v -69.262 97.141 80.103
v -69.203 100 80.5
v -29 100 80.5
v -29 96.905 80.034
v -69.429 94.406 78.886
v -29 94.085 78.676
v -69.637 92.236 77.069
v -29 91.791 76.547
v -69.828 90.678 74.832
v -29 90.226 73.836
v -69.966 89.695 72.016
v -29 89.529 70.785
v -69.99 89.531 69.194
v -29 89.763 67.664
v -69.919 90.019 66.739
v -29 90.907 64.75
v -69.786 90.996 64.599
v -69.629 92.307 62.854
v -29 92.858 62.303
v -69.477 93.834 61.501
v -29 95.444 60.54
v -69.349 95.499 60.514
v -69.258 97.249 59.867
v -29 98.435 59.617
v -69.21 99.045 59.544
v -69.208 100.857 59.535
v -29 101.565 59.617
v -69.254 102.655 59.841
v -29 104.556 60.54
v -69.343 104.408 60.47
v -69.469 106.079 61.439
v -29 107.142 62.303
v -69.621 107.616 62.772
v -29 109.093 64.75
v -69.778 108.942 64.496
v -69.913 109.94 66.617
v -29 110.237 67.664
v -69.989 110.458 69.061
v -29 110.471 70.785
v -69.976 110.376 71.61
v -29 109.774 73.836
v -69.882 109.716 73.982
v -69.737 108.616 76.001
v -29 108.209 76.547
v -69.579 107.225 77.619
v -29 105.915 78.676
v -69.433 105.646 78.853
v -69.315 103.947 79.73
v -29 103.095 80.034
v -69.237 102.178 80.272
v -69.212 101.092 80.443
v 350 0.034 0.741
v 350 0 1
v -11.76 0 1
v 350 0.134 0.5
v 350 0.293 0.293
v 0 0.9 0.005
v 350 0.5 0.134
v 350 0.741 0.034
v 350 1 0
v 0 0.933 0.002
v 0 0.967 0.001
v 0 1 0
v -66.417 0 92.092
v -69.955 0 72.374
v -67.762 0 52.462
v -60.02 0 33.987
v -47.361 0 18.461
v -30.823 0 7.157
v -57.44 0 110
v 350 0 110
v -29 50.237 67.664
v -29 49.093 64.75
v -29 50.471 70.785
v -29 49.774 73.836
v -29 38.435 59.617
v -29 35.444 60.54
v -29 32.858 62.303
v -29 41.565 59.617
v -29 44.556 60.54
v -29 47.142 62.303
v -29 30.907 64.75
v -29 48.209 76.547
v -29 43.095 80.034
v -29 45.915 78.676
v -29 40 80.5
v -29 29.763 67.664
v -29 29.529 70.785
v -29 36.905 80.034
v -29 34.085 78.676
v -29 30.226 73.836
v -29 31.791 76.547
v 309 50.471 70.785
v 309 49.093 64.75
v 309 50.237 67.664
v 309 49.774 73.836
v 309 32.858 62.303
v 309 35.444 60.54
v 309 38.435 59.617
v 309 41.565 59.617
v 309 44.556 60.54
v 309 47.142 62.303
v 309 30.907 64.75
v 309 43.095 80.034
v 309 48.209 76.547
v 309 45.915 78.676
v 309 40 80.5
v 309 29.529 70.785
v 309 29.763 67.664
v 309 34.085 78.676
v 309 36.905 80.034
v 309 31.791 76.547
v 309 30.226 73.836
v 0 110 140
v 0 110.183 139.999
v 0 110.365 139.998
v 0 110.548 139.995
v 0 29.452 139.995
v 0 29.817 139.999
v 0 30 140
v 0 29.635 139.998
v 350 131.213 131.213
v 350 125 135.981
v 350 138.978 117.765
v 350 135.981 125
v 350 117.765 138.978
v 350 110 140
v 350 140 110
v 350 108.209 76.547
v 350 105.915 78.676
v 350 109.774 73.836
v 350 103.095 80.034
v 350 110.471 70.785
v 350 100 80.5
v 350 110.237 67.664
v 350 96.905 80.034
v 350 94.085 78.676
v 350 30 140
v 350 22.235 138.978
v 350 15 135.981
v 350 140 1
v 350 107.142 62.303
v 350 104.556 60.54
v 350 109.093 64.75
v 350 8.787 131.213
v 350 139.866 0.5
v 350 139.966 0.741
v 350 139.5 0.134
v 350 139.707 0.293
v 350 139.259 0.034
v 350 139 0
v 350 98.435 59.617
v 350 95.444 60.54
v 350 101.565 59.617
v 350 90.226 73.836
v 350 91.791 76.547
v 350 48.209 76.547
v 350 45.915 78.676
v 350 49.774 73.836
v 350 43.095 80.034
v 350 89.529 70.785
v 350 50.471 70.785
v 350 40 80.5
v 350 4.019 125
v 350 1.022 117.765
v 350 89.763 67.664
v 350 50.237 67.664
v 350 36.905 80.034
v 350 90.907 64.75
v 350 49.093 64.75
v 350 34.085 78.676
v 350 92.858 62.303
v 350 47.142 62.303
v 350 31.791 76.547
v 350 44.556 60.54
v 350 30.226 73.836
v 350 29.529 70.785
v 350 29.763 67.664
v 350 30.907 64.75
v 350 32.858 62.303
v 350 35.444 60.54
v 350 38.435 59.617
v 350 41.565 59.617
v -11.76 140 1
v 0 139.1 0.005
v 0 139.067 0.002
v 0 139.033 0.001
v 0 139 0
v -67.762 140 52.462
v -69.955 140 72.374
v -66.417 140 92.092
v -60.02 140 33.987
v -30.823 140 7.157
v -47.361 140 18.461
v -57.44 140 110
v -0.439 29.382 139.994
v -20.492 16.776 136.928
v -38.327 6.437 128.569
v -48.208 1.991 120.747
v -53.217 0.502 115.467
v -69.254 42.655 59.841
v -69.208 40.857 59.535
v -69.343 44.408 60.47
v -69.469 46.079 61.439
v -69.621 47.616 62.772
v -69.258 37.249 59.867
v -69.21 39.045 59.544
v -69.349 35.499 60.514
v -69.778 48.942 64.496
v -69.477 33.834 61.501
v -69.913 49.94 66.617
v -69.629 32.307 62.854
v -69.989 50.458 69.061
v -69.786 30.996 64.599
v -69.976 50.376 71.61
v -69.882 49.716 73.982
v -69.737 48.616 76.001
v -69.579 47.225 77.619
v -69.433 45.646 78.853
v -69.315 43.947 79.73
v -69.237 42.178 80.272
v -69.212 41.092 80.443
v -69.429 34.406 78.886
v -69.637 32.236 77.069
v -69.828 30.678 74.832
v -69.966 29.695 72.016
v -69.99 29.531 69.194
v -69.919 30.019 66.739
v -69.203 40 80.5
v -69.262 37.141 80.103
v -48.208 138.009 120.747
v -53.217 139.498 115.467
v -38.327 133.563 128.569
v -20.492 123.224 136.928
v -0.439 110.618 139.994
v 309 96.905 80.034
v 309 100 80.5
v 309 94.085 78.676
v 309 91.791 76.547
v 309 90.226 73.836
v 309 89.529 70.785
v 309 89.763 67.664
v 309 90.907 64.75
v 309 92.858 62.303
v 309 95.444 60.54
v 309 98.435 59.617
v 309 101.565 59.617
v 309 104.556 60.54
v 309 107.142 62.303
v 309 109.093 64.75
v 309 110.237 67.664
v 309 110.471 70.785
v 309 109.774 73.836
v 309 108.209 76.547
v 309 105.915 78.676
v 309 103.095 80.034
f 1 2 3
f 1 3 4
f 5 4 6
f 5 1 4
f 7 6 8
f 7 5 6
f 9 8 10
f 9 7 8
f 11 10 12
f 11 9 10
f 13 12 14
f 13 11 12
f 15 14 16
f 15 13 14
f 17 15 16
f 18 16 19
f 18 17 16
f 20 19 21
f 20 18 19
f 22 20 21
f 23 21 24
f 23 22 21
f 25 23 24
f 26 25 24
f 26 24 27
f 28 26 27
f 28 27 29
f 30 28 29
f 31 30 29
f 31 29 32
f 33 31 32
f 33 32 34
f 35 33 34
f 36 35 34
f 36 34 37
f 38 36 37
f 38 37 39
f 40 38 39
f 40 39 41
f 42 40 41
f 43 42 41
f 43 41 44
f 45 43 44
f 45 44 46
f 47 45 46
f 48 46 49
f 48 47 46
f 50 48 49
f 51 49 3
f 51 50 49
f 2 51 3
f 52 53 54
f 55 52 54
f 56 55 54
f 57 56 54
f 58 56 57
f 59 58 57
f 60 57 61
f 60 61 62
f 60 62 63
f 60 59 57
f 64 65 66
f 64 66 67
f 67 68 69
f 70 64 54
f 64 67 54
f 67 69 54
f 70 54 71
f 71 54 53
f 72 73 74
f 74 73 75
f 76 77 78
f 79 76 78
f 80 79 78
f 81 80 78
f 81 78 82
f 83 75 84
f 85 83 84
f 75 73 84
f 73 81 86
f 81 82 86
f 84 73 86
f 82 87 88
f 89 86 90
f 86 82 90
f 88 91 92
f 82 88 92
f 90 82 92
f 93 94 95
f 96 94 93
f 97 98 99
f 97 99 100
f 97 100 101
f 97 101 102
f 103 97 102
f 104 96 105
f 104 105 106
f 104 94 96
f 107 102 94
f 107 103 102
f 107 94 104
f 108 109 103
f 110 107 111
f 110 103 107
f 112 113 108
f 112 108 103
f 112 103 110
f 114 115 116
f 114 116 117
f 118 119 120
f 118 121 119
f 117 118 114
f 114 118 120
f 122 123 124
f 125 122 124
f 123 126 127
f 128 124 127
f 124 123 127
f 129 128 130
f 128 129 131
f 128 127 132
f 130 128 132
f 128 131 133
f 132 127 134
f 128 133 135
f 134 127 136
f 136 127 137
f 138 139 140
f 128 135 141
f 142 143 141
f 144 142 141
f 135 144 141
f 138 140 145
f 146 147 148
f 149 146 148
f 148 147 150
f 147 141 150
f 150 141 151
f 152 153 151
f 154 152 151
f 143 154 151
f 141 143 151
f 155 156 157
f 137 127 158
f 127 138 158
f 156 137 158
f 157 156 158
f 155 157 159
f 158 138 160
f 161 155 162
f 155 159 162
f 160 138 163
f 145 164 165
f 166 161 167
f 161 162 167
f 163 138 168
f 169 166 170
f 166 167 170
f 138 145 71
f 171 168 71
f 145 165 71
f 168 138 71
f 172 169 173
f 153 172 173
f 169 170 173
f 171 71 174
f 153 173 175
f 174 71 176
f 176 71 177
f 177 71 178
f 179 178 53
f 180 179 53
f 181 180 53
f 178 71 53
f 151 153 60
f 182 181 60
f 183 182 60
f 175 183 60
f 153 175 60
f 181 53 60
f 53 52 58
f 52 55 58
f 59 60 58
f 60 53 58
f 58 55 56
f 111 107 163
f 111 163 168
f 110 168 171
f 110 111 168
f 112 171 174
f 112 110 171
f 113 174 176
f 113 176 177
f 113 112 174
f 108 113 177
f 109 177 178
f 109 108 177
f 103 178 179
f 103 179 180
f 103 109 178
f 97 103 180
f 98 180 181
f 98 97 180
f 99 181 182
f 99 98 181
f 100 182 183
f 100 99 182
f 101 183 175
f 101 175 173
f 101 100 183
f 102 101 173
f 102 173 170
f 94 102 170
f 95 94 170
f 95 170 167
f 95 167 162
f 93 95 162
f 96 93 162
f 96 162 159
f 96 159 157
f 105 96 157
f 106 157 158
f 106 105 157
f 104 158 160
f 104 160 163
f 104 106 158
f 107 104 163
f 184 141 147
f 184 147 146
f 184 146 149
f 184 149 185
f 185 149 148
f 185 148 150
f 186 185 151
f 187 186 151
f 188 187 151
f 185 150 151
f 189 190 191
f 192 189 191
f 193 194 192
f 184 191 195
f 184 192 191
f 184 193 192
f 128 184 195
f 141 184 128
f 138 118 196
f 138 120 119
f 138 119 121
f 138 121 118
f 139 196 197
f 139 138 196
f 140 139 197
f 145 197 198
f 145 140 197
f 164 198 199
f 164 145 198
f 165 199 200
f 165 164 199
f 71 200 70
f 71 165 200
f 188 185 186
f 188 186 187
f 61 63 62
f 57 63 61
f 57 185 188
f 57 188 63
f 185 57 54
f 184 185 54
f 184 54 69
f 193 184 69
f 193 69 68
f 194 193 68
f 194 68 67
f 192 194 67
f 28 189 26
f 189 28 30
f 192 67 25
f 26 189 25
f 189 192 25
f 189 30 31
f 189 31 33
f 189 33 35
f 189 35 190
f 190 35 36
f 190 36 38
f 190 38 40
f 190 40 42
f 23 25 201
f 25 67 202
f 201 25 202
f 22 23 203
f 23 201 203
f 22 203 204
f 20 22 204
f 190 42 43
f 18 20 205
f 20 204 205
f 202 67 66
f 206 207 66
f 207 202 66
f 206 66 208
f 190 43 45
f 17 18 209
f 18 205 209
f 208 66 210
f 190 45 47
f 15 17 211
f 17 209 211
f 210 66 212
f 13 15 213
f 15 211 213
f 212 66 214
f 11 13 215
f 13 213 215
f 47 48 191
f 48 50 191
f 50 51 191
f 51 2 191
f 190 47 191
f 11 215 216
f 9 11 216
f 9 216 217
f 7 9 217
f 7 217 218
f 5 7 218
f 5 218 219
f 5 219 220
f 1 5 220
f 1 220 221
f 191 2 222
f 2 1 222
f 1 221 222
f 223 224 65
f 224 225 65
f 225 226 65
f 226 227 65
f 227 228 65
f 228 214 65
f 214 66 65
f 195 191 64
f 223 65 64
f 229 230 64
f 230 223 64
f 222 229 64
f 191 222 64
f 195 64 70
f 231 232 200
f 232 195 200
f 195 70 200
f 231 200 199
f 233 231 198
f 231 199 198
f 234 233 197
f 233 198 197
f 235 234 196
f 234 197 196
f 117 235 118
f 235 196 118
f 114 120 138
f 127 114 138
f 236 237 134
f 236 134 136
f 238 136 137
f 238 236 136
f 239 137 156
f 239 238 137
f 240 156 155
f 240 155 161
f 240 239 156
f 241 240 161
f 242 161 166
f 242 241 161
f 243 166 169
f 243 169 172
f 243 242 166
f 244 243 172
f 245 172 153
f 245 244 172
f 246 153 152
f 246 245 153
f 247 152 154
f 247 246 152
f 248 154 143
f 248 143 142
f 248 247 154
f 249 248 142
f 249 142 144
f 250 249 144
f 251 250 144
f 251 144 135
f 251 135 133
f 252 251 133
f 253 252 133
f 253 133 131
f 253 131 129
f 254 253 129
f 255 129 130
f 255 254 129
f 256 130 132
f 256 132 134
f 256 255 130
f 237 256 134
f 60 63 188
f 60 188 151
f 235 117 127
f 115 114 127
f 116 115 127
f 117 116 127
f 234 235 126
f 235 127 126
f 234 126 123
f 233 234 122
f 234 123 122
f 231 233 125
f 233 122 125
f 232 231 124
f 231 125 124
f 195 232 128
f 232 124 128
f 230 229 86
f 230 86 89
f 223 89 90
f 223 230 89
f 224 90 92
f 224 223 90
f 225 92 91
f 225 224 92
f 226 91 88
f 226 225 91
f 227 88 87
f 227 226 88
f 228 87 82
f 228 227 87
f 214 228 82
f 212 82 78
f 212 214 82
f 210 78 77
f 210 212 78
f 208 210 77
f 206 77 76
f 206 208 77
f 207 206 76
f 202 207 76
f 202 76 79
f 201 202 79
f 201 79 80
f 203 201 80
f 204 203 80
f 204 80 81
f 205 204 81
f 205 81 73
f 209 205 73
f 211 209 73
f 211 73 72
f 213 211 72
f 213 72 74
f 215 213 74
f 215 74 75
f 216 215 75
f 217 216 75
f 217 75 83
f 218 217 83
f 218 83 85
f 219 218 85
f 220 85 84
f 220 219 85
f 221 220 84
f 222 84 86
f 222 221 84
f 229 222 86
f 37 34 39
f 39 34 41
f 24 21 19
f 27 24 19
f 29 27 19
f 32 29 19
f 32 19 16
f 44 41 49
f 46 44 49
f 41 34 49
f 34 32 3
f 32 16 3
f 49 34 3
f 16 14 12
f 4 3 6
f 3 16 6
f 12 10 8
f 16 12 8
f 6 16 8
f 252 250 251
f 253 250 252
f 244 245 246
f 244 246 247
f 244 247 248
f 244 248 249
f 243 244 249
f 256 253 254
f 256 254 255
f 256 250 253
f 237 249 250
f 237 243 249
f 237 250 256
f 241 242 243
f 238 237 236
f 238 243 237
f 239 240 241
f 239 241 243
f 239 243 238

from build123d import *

# Parameters (mm, degrees)
SKETCH1_R           = 69.995
SKETCH1_W           = 350
SKETCH1_H           = 140
BOSS_EXTRUDE1_DEPTH = 140
SKETCH2_R           = 10.5
CUT_EXTRUDE3_DEPTH  = 41
FILLET2_R           = 30
FILLET3_R           = 1
CUT_EXTRUDE4_START  = -41
SKETCH3_R           = 10.5
CUT_EXTRUDE4_DEPTH  = 41


with BuildPart() as part:
    # Sketch1 → Boss-Extrude1 (new body)
    with BuildSketch(Plane(origin=(0, 0, 0), x_dir=(1, 0, 0), z_dir=(0, 1, 0))):
        with Locations((0, -70)):
            Circle(SKETCH1_R)
        with Locations((175, -70)):
            Rectangle(SKETCH1_W, SKETCH1_H)
    extrude(amount=BOSS_EXTRUDE1_DEPTH)

    # Sketch2 → Cut-Extrude3 (cut)
    with BuildSketch(Plane(origin=(-70, 0, 0), x_dir=(0, 0, -1), z_dir=(1, 0, 0))):
        with Locations(Location((-70, 100, 0), (0, 0, 180))):
            Circle(SKETCH2_R)
        with Locations(Location((-70, 40, 0), (0, 0, 180))):
            Circle(SKETCH2_R)
    extrude(amount=CUT_EXTRUDE3_DEPTH, mode=Mode.SUBTRACT)

    # Fillet2
    fillet2_edges = [part.edges().sort_by_distance(p)[0] for p in [
        (175, 140, 140),
        (175, 0, 140),
    ]]
    fillet(fillet2_edges, radius=FILLET2_R)

    # Fillet3
    fillet3_edges = [part.edges().sort_by_distance(p)[0] for p in [
        (175, 140, 0),
        (175, 0, 0),
    ]]
    fillet(fillet3_edges, radius=FILLET3_R)

    # Sketch3 → Cut-Extrude4 (cut)
    with BuildSketch(Plane(origin=(350, 0, 0), x_dir=(0, 0, -1), z_dir=(1, 0, 0)).offset(CUT_EXTRUDE4_START)):
        with Locations(Location((-70, 100, 0), (0, 0, 180))):
            Circle(SKETCH3_R)
        with Locations(Location((-70, 40, 0), (0, 0, 180))):
            Circle(SKETCH3_R)
    extrude(amount=CUT_EXTRUDE4_DEPTH, mode=Mode.SUBTRACT)


solid = part.part
